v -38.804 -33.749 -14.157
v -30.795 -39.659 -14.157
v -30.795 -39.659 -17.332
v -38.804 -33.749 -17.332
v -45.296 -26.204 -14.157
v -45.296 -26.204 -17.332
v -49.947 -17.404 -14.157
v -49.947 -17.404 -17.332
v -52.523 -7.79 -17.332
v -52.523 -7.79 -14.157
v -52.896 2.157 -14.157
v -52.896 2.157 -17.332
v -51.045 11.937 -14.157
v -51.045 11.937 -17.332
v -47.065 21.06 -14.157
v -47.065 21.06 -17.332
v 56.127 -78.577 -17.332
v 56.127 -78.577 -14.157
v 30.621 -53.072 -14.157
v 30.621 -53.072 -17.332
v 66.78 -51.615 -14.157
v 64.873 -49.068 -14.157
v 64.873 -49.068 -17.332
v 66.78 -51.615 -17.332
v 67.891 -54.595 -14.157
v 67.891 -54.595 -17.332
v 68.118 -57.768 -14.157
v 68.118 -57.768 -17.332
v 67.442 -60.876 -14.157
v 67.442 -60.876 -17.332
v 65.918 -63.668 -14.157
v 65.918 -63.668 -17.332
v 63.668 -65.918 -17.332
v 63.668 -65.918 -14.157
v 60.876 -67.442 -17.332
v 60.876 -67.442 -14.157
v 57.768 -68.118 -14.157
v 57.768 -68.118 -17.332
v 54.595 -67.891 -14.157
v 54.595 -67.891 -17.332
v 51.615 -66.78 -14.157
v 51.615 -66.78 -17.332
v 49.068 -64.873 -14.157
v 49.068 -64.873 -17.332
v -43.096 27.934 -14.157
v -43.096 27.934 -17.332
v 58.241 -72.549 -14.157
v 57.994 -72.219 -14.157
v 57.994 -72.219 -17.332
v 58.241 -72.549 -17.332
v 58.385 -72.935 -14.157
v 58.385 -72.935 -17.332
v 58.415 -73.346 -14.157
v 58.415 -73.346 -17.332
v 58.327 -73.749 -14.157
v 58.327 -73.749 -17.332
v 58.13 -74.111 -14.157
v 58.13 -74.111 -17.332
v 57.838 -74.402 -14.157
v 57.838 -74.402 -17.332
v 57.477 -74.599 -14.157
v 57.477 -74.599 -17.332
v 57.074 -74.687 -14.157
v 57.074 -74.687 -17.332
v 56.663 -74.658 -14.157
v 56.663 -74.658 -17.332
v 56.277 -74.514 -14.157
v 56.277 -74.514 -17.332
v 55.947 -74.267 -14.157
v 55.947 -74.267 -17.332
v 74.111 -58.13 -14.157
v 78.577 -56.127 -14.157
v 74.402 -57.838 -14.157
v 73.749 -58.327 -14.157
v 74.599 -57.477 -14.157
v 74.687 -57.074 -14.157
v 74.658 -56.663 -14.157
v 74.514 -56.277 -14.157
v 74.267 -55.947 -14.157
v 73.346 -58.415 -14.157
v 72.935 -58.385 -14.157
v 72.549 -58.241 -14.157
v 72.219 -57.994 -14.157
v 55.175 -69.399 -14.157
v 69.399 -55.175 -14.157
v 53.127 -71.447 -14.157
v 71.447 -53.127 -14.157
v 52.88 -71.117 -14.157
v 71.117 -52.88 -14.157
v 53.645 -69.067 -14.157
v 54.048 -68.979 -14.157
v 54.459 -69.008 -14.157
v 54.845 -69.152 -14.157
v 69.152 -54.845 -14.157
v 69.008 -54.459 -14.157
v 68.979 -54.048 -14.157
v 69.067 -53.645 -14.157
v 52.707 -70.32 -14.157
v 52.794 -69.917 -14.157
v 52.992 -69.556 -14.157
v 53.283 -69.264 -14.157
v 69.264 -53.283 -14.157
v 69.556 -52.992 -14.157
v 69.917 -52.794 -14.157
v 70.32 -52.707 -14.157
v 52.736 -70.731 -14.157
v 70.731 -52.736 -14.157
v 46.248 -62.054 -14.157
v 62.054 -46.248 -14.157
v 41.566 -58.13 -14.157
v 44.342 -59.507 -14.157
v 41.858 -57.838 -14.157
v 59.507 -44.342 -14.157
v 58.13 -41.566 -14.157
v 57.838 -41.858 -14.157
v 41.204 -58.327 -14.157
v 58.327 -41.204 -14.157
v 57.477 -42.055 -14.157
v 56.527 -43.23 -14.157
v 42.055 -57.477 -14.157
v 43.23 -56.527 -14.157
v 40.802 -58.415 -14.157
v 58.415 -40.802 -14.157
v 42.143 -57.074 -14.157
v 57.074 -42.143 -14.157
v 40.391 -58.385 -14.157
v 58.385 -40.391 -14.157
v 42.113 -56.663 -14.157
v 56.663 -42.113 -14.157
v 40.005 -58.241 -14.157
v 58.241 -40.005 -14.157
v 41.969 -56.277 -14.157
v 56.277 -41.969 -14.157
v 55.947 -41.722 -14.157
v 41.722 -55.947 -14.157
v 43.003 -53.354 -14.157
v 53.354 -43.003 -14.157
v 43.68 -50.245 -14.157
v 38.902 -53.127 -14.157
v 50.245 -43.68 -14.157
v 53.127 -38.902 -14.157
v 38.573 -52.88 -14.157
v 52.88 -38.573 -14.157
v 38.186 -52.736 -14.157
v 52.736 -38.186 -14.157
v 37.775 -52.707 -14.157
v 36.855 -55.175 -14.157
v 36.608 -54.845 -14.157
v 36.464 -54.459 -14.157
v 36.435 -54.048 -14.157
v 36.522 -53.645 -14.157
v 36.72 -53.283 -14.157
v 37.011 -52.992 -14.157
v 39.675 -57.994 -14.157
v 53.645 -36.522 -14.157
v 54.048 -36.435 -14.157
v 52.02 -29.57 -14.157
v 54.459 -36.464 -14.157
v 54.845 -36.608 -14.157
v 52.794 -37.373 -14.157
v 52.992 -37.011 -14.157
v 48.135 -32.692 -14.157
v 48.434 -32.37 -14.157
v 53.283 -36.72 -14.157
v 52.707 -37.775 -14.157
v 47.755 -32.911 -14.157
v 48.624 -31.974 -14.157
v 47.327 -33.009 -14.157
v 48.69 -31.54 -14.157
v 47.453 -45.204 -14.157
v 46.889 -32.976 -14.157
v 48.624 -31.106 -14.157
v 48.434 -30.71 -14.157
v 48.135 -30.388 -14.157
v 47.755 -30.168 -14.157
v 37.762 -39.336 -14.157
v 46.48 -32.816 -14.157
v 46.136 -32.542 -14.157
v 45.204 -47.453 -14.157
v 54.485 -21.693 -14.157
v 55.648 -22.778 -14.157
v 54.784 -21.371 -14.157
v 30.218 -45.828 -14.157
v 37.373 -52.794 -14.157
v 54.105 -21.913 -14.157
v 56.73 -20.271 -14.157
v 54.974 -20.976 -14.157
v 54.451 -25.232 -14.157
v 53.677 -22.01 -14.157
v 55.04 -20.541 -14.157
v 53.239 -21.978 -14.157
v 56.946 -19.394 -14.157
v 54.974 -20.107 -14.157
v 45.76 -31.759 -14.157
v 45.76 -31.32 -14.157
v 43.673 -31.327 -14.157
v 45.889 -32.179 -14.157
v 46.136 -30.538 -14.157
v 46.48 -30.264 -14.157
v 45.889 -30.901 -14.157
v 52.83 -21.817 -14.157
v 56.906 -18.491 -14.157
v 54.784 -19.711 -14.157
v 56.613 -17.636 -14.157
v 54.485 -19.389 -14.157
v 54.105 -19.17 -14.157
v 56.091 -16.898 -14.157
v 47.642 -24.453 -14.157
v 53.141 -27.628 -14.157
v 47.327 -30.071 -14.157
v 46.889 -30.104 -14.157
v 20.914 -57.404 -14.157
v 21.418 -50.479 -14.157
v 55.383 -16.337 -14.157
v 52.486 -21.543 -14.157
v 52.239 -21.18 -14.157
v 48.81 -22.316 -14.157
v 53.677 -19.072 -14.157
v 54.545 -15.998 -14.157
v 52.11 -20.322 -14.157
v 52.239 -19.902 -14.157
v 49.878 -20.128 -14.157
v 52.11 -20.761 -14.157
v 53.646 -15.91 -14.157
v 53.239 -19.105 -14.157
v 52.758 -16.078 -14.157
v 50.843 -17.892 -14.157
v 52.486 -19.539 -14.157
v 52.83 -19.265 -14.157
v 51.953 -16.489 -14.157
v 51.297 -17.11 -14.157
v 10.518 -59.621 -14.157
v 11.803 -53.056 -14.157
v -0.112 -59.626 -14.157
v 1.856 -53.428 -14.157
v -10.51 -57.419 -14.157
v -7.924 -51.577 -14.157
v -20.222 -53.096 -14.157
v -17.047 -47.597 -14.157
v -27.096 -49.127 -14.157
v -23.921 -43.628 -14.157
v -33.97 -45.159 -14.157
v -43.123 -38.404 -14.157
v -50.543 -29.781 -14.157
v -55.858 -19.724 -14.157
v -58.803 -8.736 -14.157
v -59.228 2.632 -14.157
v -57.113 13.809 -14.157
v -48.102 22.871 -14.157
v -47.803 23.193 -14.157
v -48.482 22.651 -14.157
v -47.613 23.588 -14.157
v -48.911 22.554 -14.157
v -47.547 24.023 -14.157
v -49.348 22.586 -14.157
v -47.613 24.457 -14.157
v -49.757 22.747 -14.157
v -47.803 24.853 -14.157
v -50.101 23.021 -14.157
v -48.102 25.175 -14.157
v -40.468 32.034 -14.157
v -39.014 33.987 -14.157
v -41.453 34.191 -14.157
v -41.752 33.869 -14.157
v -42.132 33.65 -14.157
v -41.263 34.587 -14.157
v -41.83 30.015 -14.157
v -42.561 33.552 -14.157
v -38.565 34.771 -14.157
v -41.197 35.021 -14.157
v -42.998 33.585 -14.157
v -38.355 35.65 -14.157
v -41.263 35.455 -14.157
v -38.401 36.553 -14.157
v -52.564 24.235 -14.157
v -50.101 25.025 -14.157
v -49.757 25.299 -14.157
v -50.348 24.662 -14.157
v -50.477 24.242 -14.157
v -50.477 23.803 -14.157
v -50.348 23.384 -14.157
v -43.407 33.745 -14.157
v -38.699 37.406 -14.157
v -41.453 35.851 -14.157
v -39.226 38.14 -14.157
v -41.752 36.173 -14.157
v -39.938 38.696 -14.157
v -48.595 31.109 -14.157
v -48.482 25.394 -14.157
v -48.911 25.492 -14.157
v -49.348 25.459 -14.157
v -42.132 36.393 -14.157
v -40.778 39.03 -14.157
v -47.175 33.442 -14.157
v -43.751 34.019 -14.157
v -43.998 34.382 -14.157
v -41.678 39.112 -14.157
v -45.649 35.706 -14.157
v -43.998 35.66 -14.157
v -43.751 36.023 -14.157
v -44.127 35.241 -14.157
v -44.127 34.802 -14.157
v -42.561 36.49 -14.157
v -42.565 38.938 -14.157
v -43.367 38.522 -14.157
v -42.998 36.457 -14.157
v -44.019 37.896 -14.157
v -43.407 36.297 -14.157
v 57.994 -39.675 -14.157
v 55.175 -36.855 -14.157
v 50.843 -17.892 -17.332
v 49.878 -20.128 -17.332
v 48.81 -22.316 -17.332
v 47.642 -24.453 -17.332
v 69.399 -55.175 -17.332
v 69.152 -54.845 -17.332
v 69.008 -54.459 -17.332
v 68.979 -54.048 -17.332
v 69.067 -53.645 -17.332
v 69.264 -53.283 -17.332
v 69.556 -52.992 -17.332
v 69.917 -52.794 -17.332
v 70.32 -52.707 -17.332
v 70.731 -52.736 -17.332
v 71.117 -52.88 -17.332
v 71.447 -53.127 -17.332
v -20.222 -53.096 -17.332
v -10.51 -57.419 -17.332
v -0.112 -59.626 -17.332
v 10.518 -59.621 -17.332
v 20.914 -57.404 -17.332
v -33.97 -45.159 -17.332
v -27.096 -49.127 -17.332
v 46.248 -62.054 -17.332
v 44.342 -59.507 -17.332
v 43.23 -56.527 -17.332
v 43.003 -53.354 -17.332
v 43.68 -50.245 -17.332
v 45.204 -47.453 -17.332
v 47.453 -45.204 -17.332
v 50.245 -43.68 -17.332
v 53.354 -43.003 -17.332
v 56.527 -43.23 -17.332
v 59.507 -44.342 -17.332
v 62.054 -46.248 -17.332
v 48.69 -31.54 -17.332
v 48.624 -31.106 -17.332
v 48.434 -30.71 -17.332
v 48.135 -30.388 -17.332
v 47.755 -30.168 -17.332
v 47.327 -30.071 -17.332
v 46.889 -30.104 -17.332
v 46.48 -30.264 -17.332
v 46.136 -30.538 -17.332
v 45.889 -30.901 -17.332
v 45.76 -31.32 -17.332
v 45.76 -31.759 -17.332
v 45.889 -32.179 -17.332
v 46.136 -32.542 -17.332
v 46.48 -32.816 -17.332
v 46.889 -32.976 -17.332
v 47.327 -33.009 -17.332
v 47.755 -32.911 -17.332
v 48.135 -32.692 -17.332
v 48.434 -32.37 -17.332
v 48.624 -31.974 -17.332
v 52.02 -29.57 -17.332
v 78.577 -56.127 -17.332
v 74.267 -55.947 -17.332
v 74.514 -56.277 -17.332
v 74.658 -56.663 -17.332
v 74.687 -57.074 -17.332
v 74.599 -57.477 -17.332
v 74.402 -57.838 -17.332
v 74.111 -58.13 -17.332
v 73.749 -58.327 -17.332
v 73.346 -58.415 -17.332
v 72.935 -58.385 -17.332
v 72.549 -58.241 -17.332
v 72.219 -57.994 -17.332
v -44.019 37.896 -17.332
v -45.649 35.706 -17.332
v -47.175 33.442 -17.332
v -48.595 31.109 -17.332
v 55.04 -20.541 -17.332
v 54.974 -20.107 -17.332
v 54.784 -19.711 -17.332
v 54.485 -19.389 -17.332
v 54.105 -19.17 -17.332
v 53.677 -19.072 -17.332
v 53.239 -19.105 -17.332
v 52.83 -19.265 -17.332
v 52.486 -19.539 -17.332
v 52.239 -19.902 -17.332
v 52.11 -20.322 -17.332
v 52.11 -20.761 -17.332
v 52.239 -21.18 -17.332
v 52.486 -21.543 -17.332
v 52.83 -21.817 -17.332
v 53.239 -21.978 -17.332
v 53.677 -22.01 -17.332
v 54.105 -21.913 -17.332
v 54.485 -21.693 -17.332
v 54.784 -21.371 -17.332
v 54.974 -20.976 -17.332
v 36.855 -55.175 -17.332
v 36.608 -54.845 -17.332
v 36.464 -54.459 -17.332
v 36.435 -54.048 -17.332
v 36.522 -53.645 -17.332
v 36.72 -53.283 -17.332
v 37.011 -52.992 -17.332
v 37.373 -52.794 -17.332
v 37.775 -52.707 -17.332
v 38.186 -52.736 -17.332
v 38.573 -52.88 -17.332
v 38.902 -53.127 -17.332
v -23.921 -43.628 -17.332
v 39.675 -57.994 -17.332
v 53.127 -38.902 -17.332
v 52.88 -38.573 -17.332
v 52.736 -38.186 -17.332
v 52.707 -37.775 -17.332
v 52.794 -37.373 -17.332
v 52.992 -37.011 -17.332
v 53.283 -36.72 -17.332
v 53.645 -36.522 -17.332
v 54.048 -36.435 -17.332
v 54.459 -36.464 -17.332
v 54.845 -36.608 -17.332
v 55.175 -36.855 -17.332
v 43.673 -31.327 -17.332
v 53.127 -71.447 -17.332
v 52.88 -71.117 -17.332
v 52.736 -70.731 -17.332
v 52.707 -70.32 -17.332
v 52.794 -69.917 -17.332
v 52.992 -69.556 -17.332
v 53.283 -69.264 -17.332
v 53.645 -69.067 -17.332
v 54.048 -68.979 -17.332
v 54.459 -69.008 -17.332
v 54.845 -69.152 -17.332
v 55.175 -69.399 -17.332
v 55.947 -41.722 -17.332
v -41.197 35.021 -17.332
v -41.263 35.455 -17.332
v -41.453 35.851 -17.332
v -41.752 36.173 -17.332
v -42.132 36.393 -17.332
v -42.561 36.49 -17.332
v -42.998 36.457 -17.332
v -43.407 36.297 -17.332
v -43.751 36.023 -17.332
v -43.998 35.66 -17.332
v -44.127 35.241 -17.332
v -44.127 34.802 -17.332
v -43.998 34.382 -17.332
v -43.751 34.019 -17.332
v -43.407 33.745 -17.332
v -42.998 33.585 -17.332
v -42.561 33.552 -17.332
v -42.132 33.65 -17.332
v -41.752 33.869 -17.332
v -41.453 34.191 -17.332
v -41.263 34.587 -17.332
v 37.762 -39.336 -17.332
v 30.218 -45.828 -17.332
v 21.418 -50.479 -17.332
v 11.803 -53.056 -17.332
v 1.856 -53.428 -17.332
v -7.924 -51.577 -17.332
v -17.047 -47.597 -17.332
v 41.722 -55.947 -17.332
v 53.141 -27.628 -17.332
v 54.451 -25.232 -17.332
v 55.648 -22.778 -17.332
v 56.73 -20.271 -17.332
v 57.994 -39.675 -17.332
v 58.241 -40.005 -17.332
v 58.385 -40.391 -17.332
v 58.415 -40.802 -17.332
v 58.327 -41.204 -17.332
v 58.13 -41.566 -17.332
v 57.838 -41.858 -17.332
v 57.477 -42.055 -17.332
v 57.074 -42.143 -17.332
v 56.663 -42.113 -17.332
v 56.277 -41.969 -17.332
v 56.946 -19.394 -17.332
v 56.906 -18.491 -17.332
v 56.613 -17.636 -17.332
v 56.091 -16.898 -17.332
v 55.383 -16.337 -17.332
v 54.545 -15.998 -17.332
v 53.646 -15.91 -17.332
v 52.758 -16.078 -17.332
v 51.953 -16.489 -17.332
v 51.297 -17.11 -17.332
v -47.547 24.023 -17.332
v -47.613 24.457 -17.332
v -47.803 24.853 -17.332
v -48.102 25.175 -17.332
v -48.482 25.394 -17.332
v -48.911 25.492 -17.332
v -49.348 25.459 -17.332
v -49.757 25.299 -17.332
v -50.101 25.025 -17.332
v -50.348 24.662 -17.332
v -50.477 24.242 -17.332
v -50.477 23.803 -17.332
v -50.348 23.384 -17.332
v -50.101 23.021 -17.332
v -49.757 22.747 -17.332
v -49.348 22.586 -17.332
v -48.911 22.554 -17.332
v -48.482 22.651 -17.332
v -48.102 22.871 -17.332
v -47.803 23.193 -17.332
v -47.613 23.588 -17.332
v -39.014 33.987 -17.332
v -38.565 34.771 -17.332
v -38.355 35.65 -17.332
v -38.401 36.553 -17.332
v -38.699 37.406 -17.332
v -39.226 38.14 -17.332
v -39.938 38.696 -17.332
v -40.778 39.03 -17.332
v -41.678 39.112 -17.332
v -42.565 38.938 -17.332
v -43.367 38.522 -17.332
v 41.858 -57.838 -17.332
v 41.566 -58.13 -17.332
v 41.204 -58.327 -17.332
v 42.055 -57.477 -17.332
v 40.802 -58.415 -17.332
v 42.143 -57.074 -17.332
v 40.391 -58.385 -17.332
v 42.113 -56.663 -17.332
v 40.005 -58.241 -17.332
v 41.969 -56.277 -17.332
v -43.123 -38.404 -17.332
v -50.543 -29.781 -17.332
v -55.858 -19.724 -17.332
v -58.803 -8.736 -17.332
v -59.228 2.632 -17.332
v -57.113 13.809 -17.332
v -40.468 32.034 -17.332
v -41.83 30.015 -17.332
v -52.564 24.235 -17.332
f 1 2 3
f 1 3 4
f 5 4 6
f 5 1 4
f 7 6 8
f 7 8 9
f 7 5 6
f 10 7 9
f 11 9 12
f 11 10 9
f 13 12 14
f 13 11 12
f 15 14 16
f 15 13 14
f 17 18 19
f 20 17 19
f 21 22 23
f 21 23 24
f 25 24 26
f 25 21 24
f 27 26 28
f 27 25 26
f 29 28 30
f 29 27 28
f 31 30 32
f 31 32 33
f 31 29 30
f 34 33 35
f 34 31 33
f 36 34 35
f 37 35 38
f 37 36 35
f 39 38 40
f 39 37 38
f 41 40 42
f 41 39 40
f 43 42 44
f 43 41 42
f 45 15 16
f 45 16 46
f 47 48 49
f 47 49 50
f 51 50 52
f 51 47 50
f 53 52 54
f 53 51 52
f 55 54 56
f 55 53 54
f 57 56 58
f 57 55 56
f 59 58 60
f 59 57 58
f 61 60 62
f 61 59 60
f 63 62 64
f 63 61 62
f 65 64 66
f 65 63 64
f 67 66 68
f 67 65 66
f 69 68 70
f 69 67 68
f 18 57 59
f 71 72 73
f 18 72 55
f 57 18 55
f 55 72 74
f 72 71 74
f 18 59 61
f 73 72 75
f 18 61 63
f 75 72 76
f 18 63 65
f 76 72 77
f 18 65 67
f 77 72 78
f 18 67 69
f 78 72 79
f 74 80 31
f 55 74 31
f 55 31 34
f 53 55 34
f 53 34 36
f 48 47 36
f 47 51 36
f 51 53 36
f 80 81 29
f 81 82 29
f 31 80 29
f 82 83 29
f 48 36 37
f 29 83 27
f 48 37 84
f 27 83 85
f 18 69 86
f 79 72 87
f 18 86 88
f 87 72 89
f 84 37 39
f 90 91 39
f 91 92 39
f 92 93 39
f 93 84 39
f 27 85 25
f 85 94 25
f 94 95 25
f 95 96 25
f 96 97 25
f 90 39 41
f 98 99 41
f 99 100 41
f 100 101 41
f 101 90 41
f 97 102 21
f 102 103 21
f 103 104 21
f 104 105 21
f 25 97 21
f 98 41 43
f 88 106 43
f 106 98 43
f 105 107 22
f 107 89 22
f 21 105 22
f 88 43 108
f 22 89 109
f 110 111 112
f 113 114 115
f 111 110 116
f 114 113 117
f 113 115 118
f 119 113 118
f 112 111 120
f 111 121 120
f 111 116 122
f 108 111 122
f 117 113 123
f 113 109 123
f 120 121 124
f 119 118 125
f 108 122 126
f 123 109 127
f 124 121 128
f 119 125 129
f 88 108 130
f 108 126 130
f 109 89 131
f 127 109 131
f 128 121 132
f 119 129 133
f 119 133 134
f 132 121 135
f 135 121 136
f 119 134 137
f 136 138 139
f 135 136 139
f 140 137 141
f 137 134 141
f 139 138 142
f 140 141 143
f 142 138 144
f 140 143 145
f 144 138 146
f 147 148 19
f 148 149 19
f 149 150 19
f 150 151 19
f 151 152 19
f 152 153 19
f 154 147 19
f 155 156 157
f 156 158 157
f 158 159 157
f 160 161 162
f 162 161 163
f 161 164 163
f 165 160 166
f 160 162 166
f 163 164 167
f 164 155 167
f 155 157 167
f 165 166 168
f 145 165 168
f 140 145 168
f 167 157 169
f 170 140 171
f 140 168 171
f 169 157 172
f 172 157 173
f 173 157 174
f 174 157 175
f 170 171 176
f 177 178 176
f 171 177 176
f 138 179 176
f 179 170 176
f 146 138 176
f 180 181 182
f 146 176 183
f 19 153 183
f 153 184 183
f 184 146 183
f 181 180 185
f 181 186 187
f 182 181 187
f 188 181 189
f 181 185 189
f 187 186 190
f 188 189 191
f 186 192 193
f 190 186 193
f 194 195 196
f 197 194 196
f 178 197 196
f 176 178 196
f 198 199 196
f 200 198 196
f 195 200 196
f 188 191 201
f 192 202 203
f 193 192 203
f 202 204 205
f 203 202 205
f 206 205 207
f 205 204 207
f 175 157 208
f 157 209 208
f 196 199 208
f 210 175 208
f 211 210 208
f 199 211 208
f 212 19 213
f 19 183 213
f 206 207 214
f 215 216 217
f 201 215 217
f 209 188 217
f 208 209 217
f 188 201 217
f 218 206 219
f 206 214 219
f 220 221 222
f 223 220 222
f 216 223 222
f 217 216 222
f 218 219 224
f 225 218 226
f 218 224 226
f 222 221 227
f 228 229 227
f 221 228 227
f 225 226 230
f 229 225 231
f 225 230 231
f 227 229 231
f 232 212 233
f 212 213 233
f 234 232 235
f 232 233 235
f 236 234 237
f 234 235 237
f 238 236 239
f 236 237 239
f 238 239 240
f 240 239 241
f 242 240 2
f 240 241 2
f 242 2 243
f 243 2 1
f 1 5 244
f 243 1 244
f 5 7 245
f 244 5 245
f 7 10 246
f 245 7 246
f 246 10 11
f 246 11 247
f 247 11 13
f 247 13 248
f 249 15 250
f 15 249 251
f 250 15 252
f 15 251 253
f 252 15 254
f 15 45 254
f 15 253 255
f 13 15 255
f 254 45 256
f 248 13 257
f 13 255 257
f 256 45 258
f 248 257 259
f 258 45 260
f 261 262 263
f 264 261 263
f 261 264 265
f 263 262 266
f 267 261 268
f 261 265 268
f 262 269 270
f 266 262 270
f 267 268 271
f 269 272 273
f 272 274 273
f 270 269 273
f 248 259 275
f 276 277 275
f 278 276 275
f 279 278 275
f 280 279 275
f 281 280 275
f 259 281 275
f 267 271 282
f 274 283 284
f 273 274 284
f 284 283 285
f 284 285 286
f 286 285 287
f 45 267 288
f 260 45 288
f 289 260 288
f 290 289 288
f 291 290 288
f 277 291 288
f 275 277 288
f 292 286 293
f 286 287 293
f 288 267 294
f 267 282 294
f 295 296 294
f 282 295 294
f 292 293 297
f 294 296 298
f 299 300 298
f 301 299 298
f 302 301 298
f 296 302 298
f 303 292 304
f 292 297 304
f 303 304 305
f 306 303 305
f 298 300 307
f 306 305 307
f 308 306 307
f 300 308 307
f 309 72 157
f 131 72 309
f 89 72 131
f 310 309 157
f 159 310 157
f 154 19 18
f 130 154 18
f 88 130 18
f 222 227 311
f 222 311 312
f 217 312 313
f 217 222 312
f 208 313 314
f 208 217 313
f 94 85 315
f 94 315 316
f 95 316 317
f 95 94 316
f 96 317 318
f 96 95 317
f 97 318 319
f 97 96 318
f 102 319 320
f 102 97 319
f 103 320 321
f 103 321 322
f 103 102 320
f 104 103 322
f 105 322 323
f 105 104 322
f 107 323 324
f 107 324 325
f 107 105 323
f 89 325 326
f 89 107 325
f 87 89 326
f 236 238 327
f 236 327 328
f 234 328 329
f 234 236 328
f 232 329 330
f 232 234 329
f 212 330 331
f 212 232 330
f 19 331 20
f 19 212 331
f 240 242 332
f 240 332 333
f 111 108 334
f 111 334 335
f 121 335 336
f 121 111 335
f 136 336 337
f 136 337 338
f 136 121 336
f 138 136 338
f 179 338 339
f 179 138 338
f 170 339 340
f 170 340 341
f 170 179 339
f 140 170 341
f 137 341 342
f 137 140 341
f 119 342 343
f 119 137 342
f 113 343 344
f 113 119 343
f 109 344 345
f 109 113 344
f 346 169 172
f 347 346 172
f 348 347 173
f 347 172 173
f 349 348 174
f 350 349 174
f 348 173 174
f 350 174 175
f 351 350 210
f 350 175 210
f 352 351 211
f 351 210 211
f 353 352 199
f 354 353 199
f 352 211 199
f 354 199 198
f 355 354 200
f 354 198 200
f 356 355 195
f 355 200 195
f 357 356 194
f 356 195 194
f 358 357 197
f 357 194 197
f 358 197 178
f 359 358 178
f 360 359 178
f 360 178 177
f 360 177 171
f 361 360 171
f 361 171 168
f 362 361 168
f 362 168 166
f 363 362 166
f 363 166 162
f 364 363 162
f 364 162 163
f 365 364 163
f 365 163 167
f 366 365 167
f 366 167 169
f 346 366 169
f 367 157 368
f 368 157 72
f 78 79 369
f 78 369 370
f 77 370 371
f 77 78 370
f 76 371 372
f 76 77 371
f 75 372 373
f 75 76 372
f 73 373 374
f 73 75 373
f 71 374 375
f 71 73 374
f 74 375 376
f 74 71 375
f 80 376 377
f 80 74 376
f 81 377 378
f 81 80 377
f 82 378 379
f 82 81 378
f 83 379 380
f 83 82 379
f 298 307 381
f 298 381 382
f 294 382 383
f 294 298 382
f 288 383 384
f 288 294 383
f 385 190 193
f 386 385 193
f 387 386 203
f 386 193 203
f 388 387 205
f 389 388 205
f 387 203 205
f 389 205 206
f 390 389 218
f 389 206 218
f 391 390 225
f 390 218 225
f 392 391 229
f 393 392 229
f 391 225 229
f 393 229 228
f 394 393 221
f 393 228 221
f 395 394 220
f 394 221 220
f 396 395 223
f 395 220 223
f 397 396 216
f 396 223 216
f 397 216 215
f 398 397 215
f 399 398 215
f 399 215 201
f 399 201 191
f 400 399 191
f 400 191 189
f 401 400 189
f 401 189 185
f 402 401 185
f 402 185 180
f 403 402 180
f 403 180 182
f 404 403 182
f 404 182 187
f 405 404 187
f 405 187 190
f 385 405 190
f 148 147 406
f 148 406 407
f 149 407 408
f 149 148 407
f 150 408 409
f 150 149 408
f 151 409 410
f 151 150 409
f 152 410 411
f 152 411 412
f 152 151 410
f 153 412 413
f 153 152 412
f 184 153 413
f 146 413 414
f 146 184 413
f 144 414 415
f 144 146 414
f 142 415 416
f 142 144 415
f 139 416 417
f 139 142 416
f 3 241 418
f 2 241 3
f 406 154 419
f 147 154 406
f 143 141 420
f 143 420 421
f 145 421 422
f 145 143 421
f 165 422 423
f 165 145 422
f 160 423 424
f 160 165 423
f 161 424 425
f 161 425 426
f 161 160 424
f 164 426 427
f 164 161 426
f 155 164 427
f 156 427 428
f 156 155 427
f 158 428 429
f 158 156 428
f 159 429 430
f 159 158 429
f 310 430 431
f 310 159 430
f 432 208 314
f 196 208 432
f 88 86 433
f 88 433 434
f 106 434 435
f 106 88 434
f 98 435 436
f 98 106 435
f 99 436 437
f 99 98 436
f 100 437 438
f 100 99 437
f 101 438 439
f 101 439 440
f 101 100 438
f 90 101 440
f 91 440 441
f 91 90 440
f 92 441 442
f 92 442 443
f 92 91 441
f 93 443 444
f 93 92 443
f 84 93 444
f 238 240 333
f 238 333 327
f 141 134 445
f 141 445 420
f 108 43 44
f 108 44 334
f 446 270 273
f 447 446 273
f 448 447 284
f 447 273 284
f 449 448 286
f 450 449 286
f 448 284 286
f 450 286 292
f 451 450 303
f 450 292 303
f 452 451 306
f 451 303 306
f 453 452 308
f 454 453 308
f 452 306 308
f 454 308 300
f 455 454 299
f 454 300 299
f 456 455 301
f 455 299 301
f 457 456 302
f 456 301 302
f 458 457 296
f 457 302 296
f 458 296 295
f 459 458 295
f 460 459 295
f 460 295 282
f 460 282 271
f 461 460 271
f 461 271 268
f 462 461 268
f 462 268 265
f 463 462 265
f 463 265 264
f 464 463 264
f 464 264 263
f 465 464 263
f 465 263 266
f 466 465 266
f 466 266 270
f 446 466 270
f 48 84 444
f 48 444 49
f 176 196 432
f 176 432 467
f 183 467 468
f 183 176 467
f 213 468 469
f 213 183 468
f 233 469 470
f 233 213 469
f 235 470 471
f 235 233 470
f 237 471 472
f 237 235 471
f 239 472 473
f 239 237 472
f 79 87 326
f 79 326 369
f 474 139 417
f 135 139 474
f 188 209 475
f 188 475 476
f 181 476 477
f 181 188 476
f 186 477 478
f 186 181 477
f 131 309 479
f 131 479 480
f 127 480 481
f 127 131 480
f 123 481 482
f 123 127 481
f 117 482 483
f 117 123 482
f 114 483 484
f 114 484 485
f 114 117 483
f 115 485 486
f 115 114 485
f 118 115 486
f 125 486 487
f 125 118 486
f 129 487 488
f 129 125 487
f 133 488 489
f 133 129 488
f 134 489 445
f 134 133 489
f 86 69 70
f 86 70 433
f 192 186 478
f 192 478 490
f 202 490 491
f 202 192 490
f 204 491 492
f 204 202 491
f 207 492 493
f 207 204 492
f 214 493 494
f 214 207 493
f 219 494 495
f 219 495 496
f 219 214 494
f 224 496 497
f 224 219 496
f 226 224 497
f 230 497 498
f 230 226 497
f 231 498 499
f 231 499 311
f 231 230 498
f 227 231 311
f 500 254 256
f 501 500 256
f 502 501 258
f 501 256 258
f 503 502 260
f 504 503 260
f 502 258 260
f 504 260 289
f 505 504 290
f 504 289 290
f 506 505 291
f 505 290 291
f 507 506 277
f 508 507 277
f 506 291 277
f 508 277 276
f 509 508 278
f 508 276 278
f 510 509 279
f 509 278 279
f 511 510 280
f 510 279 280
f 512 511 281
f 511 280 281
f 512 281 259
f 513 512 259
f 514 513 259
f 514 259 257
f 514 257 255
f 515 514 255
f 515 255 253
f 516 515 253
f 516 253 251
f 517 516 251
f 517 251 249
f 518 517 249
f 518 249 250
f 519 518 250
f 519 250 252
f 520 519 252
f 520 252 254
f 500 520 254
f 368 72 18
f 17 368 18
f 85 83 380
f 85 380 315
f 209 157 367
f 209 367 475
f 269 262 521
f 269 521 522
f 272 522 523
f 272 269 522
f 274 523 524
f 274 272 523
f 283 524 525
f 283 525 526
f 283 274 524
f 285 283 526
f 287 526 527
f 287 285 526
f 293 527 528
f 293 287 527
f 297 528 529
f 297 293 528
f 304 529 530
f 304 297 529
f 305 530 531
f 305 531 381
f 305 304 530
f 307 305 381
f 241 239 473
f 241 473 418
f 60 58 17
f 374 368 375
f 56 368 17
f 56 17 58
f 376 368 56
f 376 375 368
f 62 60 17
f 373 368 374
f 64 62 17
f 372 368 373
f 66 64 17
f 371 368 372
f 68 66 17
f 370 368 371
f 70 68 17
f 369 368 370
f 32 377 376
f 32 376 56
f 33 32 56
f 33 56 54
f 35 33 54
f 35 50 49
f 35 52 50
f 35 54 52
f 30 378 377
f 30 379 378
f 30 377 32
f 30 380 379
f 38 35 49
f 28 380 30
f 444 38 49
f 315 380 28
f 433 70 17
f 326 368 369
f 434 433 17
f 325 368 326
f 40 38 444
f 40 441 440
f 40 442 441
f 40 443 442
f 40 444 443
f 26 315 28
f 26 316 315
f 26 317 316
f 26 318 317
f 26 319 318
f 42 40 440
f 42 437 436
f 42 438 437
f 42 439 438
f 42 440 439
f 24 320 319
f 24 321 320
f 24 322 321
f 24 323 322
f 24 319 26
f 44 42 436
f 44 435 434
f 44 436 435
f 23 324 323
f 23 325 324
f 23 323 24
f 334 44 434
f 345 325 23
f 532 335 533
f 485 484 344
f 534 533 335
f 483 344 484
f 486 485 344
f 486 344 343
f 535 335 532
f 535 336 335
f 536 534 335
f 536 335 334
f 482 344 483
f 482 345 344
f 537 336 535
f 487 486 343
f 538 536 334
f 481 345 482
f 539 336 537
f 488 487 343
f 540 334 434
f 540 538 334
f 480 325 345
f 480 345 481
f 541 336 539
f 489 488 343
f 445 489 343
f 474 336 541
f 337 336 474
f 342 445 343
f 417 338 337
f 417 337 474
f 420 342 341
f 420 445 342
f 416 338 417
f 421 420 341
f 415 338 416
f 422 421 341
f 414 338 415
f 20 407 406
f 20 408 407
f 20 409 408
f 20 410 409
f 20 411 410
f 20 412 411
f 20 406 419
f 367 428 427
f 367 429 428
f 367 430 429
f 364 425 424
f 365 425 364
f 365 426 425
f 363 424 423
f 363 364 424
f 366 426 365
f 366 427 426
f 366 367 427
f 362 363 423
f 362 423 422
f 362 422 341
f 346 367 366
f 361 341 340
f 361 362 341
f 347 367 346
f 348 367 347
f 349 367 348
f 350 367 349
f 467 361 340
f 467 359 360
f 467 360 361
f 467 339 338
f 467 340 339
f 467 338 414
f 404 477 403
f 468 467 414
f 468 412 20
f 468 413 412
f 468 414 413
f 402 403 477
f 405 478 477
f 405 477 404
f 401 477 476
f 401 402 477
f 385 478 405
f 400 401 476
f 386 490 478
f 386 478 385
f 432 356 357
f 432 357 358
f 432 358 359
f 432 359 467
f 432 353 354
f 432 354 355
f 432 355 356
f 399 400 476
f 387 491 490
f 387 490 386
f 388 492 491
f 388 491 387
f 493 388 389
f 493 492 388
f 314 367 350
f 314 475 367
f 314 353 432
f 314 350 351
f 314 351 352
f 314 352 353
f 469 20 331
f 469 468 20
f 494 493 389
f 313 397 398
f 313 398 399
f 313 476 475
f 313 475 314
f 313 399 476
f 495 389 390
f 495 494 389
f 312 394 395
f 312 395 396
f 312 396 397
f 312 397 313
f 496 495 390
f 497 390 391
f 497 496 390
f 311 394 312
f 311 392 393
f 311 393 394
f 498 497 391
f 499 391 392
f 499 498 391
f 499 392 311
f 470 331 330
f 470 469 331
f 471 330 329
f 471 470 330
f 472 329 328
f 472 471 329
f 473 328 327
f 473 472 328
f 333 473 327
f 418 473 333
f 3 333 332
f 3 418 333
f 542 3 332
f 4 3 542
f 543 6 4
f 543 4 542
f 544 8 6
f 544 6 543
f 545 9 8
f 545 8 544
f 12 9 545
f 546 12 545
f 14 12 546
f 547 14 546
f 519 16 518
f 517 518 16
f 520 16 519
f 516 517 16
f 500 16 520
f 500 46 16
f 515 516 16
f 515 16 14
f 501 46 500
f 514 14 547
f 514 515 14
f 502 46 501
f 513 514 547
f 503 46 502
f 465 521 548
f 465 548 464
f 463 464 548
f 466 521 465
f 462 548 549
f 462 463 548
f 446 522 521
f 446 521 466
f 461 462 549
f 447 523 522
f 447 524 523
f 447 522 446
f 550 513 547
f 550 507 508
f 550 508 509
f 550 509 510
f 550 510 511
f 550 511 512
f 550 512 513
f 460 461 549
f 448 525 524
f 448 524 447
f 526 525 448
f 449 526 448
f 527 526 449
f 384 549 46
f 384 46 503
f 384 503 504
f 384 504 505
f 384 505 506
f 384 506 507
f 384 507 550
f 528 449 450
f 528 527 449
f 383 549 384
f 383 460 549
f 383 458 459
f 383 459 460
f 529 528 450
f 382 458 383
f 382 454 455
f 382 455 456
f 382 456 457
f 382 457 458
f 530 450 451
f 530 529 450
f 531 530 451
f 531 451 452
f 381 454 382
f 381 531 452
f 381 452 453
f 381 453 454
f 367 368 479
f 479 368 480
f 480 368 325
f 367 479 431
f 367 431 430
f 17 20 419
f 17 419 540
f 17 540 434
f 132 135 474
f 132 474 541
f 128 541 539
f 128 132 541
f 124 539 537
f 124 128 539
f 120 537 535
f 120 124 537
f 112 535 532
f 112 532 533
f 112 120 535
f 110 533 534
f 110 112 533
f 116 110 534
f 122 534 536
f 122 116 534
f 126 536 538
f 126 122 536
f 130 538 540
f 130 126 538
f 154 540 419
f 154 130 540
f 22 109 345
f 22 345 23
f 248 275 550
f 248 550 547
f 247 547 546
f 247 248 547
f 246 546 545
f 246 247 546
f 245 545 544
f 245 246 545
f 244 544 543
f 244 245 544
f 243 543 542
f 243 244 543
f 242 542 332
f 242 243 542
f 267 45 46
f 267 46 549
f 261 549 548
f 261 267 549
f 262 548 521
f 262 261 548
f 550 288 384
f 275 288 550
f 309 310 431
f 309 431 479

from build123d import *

# Parameters (mm, degrees)
BOSS_EXTRUDE1_DEPTH   = 3.175
BOSS_EXTRUDE2_DEPTH   = 3.175
F_4_CLEARANCE_HOLE1_D = 2.9464


with BuildPart() as part:
    # Sketch1 → Boss-Extrude1 (new body)
    with BuildSketch(Plane(origin=(0, 0, -14.15699402), x_dir=(-1, 0, 0), z_dir=(0, 0, -1))):
        with BuildLine():
            Line((-49.172312317, -34.502108483), (-53.141062317, -27.628031841))
            ThreePointArc((-53.141062317, -27.628031841), (-55.063803638, -24.012221257), (-56.72992661, -20.271224785))
            ThreePointArc((-56.72992661, -20.271224785), (-54.976138042, -16.13776671), (-50.842679967, -17.891555277))
            ThreePointArc((-50.842679967, -17.891555277), (-49.356678398, -21.228119699), (-47.641801003, -24.453031841))
            Line((-47.641801003, -24.453031841), (-43.673051003, -31.327108483))
            ThreePointArc((-43.673051003, -31.327108483), (-16.68272836, -52.037511462), (17.046778195, -47.596937682))
            Line((17.046778195, -47.596937682), (23.920854837, -43.628187682))
            Line((23.920854837, -43.628187682), (30.79493148, -39.659437682))
            ThreePointArc((30.79493148, -39.659437682), (51.505334458, -12.669115038), (47.064760678, 21.060391517))
            Line((47.064760678, 21.060391517), (43.096010678, 27.934468159))
            ThreePointArc((43.096010678, 27.934468159), (41.160593535, 31.032051618), (39.01404477, 33.987248938))
            ThreePointArc((39.01404477, 33.987248938), (39.561948355, 38.44382292), (44.018522337, 37.895919335))
            ThreePointArc((44.018522337, 37.895919335), (46.425258832, 34.58251628), (48.595271992, 31.109468159))
            Line((48.595271992, 31.109468159), (52.564021992, 24.235391517))
            ThreePointArc((52.564021992, 24.235391517), (57.638963455, -14.312615975), (33.96993148, -45.158698996))
            Line((33.96993148, -45.158698996), (27.095854837, -49.127448996))
            Line((27.095854837, -49.127448996), (20.221778195, -53.096198996))
            ThreePointArc((20.221778195, -53.096198996), (-18.326229296, -58.171140459), (-49.172312317, -34.502108483))
        make_face()
    extrude(amount=BOSS_EXTRUDE1_DEPTH)

    # Sketch6 → Boss-Extrude2 (add)
    with BuildSketch(Plane.XY.offset(-14.15699402)):
        Polygon((78.577241059, -56.126600757), (56.126600757, -78.577241059), (27.345741417, -49.796381719), (49.796381719, -27.345741417), align=None)
        with BuildLine():
            Line((62.053569797, -46.248319024), (64.873370219, -49.068119446))
            ThreePointArc((64.873370219, -49.068119446), (64.873370219, -64.873370219), (49.068119446, -64.873370219))
            Line((49.068119446, -64.873370219), (46.248319024, -62.053569797))
            ThreePointArc((46.248319024, -62.053569797), (46.248319024, -46.248319024), (62.053569797, -46.248319024))
        make_face(mode=Mode.SUBTRACT)
        with BuildLine():
            Line((55.946995634, -74.266718121), (53.127195212, -71.446917699))
            ThreePointArc((53.127195212, -71.446917699), (53.127195212, -69.399419304), (55.174693608, -69.399419304))
            Line((55.174693608, -69.399419304), (57.99449403, -72.219219726))
            ThreePointArc((57.99449403, -72.219219726), (57.99449403, -74.266718121), (55.946995634, -74.266718121))
        make_face(mode=Mode.SUBTRACT)
        with BuildLine():
            Line((38.902469516, -53.127195212), (41.722269938, -55.946995634))
            ThreePointArc((41.722269938, -55.946995634), (41.722269938, -57.99449403), (39.674771543, -57.99449403))
            Line((39.674771543, -57.99449403), (36.854971121, -55.174693608))
            ThreePointArc((36.854971121, -55.174693608), (36.854971121, -53.127195212), (38.902469516, -53.127195212))
        make_face(mode=Mode.SUBTRACT)
        with BuildLine():
            Line((55.174693608, -36.854971121), (57.99449403, -39.674771543))
            ThreePointArc((57.99449403, -39.674771543), (57.99449403, -41.722269938), (55.946995634, -41.722269938))
            Line((55.946995634, -41.722269938), (53.127195212, -38.902469516))
            ThreePointArc((53.127195212, -38.902469516), (53.127195212, -36.854971121), (55.174693608, -36.854971121))
        make_face(mode=Mode.SUBTRACT)
        with BuildLine():
            Line((71.446917699, -53.127195212), (74.266718121, -55.946995634))
            ThreePointArc((74.266718121, -55.946995634), (74.266718121, -57.99449403), (72.219219726, -57.99449403))
            Line((72.219219726, -57.99449403), (69.399419304, -55.174693608))
            ThreePointArc((69.399419304, -55.174693608), (69.399419304, -53.127195212), (71.446917699, -53.127195212))
        make_face(mode=Mode.SUBTRACT)
    extrude(amount=-BOSS_EXTRUDE2_DEPTH)

    # #4 Clearance Hole1 (through all)
    with Locations(Plane(origin=(0, 0, -17.33199402), x_dir=(-1, 0, 0), z_dir=(0, 0, -1))):
        with Locations((-53.56643166, -20.541270527), (-47.21643166, -31.539793155), (42.670641335, 35.021229473), (49.020641335, 24.022706845)):
            Hole(F_4_CLEARANCE_HOLE1_D / 2)


solid = part.part
